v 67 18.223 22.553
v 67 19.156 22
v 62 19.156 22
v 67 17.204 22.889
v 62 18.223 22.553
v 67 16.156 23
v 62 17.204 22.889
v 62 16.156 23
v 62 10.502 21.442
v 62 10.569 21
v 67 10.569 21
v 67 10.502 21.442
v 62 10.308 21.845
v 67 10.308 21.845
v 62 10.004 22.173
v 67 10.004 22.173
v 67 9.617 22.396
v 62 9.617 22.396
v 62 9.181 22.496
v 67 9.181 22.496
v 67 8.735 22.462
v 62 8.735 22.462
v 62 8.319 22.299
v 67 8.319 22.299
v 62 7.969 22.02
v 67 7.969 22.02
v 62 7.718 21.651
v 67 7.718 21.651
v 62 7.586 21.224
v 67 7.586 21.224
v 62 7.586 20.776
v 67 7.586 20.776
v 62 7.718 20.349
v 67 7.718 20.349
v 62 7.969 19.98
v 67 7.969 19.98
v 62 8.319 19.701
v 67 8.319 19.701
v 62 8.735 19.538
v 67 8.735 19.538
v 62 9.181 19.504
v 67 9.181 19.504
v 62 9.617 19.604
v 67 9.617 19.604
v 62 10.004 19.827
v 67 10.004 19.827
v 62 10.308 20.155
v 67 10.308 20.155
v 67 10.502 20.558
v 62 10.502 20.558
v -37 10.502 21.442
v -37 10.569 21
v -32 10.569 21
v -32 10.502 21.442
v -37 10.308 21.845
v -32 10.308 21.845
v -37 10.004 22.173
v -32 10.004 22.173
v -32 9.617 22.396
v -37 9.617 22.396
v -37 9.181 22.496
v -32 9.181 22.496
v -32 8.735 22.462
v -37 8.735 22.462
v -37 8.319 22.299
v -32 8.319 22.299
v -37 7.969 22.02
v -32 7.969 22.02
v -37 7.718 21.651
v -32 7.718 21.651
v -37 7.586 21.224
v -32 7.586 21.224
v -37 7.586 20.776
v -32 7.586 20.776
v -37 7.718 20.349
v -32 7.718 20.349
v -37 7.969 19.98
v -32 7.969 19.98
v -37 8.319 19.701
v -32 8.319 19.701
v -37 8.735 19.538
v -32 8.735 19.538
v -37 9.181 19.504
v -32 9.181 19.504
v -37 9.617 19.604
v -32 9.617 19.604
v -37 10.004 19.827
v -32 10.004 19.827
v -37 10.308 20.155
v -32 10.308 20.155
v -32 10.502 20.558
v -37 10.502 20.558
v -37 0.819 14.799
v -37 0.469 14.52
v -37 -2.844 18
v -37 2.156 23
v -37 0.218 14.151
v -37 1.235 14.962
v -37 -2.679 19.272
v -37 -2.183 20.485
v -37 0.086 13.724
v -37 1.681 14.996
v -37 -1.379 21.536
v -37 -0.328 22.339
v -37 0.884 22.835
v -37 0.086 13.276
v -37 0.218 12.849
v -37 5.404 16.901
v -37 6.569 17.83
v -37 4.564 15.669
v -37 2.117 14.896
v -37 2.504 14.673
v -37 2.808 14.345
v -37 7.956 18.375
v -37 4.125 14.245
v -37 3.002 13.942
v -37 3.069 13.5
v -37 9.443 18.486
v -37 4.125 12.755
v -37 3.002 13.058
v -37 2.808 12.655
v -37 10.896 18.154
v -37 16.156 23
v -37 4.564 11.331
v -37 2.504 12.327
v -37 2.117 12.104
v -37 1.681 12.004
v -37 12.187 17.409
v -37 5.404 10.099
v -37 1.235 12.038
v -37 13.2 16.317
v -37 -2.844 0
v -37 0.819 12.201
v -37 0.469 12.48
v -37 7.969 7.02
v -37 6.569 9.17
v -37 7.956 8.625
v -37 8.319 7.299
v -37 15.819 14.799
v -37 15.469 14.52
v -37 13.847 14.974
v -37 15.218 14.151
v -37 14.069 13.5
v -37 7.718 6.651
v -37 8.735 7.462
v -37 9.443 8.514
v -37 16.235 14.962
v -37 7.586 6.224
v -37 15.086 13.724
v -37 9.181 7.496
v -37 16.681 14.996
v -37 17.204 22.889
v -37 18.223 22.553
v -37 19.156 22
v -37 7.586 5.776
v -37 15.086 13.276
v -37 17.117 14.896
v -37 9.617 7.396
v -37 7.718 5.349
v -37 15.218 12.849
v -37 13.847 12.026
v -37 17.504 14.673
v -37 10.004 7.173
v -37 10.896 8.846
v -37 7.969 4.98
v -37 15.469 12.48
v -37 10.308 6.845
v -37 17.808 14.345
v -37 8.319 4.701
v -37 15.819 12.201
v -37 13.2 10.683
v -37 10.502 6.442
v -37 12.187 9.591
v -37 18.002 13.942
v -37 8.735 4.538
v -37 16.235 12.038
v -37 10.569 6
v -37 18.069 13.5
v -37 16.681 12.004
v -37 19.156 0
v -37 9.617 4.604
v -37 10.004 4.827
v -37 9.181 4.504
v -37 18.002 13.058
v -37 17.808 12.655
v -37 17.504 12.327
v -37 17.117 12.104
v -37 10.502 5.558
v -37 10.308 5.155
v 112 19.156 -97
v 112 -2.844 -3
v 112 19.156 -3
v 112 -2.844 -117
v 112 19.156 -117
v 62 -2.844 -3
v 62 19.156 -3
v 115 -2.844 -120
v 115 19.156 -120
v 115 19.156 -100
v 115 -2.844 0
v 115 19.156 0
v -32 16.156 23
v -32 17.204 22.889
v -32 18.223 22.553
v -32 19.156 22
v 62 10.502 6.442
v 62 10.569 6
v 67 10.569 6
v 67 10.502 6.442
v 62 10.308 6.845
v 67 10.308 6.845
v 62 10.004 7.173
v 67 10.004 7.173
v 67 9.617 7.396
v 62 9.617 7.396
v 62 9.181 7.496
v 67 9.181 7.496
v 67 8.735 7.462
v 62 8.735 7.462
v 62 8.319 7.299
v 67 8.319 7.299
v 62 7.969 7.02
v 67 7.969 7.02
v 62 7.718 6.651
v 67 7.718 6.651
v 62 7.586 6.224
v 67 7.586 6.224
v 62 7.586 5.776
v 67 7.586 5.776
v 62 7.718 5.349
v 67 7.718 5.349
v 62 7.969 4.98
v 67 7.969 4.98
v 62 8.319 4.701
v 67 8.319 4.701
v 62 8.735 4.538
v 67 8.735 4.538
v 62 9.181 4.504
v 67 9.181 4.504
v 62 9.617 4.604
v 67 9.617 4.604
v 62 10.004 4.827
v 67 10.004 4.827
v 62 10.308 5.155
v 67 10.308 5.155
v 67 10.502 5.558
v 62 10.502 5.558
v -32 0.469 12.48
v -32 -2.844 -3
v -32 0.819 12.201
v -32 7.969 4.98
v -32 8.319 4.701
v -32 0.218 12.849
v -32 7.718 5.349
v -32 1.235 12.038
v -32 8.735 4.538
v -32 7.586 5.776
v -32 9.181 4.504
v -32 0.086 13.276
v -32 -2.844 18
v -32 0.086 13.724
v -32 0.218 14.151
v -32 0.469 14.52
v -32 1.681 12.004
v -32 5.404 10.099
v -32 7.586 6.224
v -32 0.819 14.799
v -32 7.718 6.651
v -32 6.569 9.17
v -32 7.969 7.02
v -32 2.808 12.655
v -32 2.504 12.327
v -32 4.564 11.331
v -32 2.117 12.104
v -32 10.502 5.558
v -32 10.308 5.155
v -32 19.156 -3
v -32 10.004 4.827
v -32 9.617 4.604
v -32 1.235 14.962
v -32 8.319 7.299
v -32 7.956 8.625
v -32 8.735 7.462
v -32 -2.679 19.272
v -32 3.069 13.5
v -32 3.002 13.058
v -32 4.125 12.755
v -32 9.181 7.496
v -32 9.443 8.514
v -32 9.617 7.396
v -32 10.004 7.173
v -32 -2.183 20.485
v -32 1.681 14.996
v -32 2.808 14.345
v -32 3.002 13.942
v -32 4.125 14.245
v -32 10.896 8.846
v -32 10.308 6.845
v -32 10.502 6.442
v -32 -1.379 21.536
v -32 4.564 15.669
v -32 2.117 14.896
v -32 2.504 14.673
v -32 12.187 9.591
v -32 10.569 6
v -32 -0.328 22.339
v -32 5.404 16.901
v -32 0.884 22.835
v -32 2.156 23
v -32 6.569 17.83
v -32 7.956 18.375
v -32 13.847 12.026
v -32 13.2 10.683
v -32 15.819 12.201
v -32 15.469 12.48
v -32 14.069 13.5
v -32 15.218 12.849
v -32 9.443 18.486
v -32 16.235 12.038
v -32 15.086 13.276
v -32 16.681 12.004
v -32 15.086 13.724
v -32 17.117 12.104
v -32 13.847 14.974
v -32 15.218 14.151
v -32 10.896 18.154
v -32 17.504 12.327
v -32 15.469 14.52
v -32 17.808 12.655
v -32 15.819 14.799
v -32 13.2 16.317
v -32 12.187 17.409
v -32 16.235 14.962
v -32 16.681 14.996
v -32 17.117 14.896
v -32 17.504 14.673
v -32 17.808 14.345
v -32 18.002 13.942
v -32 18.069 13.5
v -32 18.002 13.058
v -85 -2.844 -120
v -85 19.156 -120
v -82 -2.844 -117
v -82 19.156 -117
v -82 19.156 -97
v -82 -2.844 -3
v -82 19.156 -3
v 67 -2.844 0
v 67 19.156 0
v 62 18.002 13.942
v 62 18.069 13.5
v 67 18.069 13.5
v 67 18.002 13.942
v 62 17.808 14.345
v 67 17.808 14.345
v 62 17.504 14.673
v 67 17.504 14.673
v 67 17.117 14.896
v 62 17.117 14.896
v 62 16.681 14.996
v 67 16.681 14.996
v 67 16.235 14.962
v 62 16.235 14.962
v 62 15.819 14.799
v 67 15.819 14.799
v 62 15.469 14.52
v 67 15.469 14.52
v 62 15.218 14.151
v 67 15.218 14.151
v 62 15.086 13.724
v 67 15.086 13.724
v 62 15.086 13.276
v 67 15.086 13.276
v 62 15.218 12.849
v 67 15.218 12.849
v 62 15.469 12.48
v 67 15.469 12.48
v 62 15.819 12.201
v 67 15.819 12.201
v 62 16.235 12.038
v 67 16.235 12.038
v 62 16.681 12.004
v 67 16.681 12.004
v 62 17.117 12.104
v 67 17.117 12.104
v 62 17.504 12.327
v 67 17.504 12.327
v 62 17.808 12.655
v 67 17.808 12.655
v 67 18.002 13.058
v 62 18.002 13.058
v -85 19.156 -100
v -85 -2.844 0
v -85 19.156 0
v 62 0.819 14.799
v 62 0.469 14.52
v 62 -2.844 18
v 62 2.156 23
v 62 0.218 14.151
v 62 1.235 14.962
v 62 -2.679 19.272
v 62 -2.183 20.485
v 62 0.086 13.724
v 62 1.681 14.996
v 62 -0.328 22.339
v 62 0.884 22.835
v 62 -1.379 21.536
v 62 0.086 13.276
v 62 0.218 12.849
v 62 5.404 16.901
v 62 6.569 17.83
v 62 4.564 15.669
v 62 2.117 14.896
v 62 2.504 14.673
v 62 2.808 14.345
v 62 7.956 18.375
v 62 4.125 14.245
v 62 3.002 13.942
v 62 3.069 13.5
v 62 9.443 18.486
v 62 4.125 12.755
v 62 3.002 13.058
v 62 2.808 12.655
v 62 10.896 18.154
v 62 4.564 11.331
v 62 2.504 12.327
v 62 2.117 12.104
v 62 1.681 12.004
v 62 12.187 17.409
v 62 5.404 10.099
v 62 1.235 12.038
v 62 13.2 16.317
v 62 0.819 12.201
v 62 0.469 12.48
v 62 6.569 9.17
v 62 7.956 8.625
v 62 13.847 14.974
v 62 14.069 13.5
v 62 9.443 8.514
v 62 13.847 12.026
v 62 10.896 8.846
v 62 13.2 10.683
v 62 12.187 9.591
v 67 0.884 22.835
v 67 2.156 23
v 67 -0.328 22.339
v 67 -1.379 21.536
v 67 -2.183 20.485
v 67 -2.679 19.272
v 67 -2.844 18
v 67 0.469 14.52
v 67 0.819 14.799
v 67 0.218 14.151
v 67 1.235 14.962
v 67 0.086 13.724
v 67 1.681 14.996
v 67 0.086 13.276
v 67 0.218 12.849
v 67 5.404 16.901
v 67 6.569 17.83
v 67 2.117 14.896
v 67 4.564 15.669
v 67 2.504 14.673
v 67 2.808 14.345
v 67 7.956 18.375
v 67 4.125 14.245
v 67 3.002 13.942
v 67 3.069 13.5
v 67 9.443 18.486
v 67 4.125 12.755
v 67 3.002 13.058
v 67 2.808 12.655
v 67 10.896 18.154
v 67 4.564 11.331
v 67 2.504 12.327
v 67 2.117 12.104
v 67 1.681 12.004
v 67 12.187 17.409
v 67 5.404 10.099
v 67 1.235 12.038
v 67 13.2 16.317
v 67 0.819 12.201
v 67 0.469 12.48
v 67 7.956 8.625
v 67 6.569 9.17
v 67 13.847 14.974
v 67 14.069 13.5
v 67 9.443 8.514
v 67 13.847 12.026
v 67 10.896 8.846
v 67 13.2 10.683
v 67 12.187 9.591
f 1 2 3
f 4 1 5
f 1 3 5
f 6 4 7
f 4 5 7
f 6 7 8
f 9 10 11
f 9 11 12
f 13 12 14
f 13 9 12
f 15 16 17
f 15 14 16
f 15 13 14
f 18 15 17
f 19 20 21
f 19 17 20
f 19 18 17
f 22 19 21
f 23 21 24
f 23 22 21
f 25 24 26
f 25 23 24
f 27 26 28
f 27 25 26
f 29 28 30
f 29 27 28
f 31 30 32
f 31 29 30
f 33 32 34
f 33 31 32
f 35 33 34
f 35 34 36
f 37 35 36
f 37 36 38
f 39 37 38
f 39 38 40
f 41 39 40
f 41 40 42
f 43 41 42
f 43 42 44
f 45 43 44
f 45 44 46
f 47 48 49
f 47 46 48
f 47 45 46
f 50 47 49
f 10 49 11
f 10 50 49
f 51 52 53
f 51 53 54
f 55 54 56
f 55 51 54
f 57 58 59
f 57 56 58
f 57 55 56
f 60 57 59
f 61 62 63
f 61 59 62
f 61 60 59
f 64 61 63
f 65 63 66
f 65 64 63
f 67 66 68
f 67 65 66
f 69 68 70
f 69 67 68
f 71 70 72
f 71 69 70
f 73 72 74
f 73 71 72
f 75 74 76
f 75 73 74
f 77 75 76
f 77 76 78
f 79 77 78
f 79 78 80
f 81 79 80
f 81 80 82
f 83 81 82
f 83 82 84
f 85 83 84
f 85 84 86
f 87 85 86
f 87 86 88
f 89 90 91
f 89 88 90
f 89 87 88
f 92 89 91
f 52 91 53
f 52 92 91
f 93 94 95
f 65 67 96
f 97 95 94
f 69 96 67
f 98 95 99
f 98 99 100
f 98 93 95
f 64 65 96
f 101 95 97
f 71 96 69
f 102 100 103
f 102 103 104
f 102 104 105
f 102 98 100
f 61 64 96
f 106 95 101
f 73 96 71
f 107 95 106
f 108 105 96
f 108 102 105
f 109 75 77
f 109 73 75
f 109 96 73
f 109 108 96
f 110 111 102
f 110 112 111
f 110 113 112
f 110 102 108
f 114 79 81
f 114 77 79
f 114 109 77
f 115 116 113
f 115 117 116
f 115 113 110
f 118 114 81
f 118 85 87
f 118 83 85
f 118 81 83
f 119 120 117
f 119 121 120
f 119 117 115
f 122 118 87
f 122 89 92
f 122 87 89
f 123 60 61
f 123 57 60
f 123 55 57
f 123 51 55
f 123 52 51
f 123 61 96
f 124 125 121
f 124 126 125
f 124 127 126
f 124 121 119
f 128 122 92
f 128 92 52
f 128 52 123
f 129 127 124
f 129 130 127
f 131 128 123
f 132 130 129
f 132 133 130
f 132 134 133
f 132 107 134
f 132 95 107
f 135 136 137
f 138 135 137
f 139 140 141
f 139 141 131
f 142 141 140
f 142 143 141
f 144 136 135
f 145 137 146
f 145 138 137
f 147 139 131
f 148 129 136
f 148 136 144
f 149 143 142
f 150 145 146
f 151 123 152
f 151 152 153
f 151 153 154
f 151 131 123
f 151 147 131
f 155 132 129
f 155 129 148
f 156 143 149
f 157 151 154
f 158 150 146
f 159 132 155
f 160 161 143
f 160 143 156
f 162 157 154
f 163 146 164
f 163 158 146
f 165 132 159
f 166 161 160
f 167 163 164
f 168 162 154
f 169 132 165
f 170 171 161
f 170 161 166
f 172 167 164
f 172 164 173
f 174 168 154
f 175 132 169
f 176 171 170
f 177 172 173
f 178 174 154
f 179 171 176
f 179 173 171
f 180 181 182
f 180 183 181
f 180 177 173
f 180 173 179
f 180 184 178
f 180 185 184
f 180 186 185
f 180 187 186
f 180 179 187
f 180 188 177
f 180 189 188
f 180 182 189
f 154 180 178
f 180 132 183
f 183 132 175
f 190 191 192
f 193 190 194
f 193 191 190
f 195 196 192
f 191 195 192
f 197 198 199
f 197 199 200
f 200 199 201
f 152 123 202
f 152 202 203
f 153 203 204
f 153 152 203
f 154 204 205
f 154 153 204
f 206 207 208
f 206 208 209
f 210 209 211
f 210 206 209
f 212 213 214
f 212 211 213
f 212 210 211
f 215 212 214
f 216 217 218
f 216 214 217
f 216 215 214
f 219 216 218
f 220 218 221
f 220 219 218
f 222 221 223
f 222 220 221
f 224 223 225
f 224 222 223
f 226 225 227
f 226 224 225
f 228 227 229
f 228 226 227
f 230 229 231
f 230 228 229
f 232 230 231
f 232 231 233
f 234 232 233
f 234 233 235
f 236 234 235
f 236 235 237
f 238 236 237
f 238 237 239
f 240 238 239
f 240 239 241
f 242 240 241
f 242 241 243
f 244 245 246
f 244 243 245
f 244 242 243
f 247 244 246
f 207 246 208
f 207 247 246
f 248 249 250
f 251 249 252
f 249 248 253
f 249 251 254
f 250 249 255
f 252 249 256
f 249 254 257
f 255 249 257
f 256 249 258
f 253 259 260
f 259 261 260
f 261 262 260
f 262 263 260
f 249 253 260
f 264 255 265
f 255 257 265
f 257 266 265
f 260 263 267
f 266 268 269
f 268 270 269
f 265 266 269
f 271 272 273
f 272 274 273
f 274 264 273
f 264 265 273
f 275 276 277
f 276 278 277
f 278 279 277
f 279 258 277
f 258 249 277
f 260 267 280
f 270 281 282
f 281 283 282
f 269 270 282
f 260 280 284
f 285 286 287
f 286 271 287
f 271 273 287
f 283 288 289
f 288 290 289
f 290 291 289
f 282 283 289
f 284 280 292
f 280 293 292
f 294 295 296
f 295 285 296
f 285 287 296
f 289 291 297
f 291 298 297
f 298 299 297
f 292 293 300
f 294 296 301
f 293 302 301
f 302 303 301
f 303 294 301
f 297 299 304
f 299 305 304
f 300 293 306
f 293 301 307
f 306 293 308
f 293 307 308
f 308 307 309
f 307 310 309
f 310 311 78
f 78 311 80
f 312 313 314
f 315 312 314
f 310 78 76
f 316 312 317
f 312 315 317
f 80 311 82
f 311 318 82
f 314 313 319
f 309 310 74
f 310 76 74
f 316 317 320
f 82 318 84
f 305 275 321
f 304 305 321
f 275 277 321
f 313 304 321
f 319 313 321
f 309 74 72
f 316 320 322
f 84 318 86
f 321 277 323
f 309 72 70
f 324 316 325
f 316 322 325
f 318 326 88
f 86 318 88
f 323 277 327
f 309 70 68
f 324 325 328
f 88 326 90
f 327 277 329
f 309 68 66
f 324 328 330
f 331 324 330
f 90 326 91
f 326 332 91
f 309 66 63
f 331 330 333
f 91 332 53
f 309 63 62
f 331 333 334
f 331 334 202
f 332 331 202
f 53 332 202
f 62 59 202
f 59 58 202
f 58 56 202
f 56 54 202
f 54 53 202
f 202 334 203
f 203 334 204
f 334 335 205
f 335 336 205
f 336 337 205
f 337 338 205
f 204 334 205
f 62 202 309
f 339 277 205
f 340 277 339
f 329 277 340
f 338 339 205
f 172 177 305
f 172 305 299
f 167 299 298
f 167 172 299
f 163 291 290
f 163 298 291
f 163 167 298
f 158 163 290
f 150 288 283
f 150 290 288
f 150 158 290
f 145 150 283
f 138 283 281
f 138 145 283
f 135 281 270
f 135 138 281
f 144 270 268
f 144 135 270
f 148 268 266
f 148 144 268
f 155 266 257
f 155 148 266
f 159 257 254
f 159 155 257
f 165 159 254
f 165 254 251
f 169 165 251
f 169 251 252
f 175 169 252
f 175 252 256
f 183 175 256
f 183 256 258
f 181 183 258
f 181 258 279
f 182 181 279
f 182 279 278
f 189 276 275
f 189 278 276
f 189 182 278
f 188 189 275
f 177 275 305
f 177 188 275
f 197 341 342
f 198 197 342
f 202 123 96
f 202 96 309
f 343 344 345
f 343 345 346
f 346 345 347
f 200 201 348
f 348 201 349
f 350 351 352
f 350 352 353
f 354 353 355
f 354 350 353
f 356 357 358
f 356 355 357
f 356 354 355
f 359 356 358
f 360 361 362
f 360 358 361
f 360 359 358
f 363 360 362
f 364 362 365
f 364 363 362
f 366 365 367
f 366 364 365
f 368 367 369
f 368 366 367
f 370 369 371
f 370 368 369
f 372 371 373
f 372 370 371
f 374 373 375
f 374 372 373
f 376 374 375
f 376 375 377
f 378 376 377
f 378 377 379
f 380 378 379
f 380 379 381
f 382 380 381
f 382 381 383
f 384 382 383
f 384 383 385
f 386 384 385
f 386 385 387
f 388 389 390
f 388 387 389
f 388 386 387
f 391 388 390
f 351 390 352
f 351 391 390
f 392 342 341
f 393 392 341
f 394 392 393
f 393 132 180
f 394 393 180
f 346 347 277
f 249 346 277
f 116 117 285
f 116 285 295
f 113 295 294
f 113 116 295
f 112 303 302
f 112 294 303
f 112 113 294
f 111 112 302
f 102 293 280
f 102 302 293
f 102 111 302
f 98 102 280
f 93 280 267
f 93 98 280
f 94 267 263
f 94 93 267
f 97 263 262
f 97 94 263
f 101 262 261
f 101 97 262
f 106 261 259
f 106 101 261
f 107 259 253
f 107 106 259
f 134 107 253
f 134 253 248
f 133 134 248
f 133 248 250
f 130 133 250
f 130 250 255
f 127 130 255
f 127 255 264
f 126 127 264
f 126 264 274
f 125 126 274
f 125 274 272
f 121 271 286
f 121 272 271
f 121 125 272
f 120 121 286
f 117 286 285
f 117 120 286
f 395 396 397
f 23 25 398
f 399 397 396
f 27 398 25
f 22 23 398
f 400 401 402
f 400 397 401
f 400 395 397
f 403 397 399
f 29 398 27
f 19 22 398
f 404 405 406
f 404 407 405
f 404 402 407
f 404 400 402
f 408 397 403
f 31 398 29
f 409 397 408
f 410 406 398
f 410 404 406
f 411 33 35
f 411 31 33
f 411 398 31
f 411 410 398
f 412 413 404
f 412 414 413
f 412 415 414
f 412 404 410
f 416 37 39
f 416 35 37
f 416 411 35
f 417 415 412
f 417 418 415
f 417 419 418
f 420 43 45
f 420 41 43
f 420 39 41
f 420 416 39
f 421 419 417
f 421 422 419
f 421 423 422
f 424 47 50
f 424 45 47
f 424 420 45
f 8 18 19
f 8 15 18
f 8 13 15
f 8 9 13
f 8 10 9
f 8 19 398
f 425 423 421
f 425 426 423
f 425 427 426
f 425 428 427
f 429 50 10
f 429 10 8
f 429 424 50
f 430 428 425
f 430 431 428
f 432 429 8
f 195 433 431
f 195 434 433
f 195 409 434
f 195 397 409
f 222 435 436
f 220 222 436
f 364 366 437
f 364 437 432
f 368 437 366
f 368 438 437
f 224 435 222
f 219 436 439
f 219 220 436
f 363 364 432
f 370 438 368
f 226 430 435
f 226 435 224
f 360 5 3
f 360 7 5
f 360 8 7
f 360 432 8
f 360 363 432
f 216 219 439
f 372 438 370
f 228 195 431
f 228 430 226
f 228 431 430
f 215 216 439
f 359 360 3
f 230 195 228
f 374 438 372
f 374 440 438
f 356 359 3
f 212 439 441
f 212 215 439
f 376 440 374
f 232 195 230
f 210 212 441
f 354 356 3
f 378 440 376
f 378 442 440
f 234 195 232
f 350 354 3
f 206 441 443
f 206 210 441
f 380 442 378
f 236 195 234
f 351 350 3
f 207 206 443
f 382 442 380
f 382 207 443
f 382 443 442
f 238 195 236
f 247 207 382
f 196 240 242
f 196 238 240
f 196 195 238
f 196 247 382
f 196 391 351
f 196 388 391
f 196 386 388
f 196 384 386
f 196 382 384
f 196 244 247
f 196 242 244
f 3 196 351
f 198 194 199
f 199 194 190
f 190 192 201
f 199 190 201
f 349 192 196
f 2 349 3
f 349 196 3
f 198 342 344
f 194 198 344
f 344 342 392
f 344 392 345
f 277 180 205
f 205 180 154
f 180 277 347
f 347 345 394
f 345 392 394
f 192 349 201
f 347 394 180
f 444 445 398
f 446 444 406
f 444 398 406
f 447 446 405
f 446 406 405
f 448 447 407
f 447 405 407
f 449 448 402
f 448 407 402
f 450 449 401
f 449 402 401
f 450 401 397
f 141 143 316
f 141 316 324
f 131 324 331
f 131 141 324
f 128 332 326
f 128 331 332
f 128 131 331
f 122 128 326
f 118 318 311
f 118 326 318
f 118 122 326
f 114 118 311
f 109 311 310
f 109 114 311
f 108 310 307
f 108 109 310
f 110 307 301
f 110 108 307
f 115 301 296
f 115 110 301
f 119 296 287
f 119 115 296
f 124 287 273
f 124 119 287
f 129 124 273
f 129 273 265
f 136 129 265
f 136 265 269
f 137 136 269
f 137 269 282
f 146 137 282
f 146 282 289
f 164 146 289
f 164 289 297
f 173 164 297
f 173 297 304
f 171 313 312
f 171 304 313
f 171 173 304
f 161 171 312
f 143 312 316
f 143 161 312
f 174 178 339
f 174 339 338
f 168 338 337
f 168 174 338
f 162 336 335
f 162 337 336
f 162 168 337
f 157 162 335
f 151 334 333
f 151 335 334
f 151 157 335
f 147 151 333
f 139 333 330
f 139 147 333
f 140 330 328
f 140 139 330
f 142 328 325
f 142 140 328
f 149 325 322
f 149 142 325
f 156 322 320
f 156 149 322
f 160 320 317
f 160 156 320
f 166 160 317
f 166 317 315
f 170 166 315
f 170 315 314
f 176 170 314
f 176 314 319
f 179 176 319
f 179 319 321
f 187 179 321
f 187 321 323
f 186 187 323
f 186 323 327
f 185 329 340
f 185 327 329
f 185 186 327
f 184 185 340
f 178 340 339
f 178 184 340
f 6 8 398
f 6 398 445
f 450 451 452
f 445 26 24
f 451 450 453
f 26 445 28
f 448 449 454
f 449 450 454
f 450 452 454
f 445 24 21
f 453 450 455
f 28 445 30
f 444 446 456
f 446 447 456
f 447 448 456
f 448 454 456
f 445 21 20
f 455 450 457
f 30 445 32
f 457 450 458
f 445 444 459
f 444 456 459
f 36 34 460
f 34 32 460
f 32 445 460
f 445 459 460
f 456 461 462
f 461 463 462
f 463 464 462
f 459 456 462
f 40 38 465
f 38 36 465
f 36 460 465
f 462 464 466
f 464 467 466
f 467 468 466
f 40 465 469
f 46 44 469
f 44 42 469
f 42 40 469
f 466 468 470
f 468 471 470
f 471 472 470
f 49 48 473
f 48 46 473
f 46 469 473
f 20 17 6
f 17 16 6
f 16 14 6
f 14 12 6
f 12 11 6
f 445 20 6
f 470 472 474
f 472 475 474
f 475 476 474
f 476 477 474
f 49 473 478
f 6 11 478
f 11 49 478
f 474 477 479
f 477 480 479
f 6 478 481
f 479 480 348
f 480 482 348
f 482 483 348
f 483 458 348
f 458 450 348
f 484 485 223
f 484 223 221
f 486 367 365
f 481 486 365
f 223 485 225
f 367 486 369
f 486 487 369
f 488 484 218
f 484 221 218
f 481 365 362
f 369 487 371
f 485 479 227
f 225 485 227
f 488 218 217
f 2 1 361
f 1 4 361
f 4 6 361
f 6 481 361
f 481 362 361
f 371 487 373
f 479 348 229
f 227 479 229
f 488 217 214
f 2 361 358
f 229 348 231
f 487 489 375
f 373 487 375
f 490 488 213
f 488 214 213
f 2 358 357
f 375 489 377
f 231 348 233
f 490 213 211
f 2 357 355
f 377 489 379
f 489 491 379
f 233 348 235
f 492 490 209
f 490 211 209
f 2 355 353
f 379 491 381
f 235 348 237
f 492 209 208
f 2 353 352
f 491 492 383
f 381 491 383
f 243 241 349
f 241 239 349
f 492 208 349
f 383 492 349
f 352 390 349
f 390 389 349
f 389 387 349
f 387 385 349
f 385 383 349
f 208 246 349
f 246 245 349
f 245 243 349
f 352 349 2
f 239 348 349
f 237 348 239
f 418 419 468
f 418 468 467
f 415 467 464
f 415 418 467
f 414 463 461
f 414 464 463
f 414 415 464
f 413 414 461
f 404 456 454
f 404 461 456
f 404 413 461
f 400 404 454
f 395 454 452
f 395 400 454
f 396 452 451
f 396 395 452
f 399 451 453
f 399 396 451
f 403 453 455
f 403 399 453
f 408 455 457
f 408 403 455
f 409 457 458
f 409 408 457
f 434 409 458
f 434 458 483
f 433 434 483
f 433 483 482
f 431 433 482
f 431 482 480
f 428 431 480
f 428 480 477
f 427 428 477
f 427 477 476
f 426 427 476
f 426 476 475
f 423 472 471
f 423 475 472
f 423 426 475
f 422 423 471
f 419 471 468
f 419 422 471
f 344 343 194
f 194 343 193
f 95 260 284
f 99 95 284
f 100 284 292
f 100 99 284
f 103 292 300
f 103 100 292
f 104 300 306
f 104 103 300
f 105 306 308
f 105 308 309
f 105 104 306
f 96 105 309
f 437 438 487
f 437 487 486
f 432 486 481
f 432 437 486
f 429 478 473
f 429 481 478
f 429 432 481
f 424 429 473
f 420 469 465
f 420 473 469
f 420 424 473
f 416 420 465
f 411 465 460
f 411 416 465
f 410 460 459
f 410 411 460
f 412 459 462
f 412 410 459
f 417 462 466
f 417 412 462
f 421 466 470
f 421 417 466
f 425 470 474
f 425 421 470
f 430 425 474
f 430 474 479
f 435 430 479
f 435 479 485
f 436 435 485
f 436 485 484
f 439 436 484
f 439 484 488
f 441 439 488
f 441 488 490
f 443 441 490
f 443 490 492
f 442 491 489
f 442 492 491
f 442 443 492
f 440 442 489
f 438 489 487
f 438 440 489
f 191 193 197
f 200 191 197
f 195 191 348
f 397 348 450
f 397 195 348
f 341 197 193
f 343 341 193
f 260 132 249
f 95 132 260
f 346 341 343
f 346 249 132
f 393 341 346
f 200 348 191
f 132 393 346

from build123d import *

# Parameters (mm, degrees)
SKETCH_1_W               = 104
SKETCH_1_H               = 40
SKETCH_1_R               = 5
SKETCH_1_R_2             = 1.5
EXTRUDE_1_DEPTH          = 3
SKETCH_2_W               = 5
SKETCH_2_H               = 40
EXTRUDE_2_DEPTH          = 20
CUT_EXTRUDE_1_DEPTH      = 111.431414635
CUT_EXTRUDE_1_DEPTH_BACK = 111.431414635
SKETCH_3_R               = 1.5
SKETCH_3_R_2             = 5
FILLET_1_R               = 10
SKETCH_4_W               = 200
SKETCH_4_H               = 40
EXTRUDE_3_DEPTH          = 100
CUT_EXTRUDE_2_DEPTH      = 100
CUT_EXTRUDE_3_DEPTH      = 185.266376038
CUT_EXTRUDE_3_DEPTH_BACK = 185.266376038
FILLET_2_R               = 5
CUT_EXTRUDE_4_DEPTH      = 226.499661516
CUT_EXTRUDE_4_DEPTH_BACK = 226.499661516
CUT_EXTRUDE_5_DEPTH      = 225.605419664
CUT_EXTRUDE_5_DEPTH_BACK = 225.605419664
SKETCH_8_W               = 135.335857316
SKETCH_8_H               = 8.120151439
SKETCH_9_W               = 20
SKETCH_9_H               = 22
EXTRUDE_4_DEPTH          = 200
CUT_EXTRUDE_6_DEPTH      = 168.657388896
CUT_EXTRUDE_6_DEPTH_BACK = 168.657388896
SKETCH_10_W              = 194
SKETCH_10_H              = 20


with BuildPart() as part:
    # 草图1 → 凸台-拉伸1 (new body)
    with BuildSketch(Plane.XY):
        with Locations((15, 9.156428763)):
            Rectangle(SKETCH_1_W, SKETCH_1_H)
        with Locations((15, 9.156428763)):
            Circle(SKETCH_1_R, mode=Mode.SUBTRACT)
        with Locations((15, 16.656428763)):
            Circle(SKETCH_1_R_2, mode=Mode.SUBTRACT)
        with Locations((22.5, 9.156428763)):
            Circle(SKETCH_1_R_2, mode=Mode.SUBTRACT)
        with Locations((15, 1.656428763)):
            Circle(SKETCH_1_R_2, mode=Mode.SUBTRACT)
        with Locations((7.5, 9.156428763)):
            Circle(SKETCH_1_R_2, mode=Mode.SUBTRACT)
    extrude(amount=EXTRUDE_1_DEPTH)

    # 草图2 → 凸台-拉伸2 (add)
    with BuildSketch(Plane.XY.offset(3)):
        with Locations((-34.5, 9.156428763)):
            Rectangle(SKETCH_2_W, SKETCH_2_H)
        with Locations((64.5, 9.156428763)):
            Rectangle(SKETCH_2_W, SKETCH_2_H)
    extrude(amount=EXTRUDE_2_DEPTH)

    # 草图3 → 切除-拉伸1 (cut, two sides: drawn at the far end of the back side and taken through both)
    with BuildSketch(Plane(origin=(67, 0, 0), x_dir=(0, 0, -1), z_dir=(1, 0, 0)).offset(-CUT_EXTRUDE_1_DEPTH_BACK)):
        with Locations(Location((-13.5, 16.569068444, 0), (0, 0, 90))):
            Circle(SKETCH_3_R)
        with Locations(Location((-13.5, 1.569068444, 0), (0, 0, 90))):
            Circle(SKETCH_3_R)
        with Locations(Location((-13.5, 9.069068444, 0), (0, 0, 90))):
            Circle(SKETCH_3_R_2)
        with Locations(Location((-6, 9.069068444, 0), (0, 0, 90))):
            Circle(SKETCH_3_R)
        with Locations(Location((-21, 9.069068444, 0), (0, 0, 90))):
            Circle(SKETCH_3_R)
    extrude(amount=CUT_EXTRUDE_1_DEPTH + CUT_EXTRUDE_1_DEPTH_BACK, mode=Mode.SUBTRACT)

    # 圆角1
    fillet_1_edges = [part.edges().sort_by_distance(p)[0] for p in [
        (-34.5, 29.156428763, 23),
        (-34.5, -10.843571237, 23),
        (64.5, 29.156428763, 23),
        (64.5, -10.843571237, 23),
    ]]
    fillet(fillet_1_edges, radius=FILLET_1_R)

    # 草图4 → 凸台-拉伸3 (add)
    with BuildSketch(Plane(origin=(0, 0, 0), x_dir=(-1, 0, 0), z_dir=(0, 0, -1))):
        with Locations((-15, 9.156428763)):
            Rectangle(SKETCH_4_W, SKETCH_4_H)
    extrude(amount=EXTRUDE_3_DEPTH)

    # 草图5 → 切除-拉伸2 (cut)
    with BuildSketch(Plane(origin=(0, 29.156428763, 0), x_dir=(1, 0, 0), z_dir=(0, 1, 0))):
        Polygon((112, 97), (-82, 97), (-82, 3), (-32, 3), (-32, -3), (62, -3), (62, 3), (112, 3), align=None)
    extrude(amount=-CUT_EXTRUDE_2_DEPTH, mode=Mode.SUBTRACT)

    # 草图6 → 切除-拉伸3 (cut, two sides: drawn at the far end of the back side and taken through both)
    with BuildSketch(Plane.ZY.offset(37).offset(-CUT_EXTRUDE_3_DEPTH_BACK)):
        Polygon((0, 21.156428763), (22.797958971, 21.156428763), (26.883028225, 31.204196531), (0, 34.707184858), align=None)
        Polygon((0, -2.843571237), (22.797958971, -2.843571237), (28.320151641, -11.460404888), (0, -17.388538979), align=None)
    extrude(amount=CUT_EXTRUDE_3_DEPTH + CUT_EXTRUDE_3_DEPTH_BACK, mode=Mode.SUBTRACT)

    # 圆角2
    fillet_2_edges = [part.edges().sort_by_distance(p)[0] for p in [
        (-34.5, -2.843571237, 22.797958971),
        (-34.5, 21.156428763, 22.797958971),
        (64.5, -2.843571237, 22.797958971),
        (64.5, 21.156428763, 22.797958971),
    ]]
    fillet(fillet_2_edges, radius=FILLET_2_R)

    # 草图7 → 切除-拉伸4 (cut, two sides: drawn at the far end of the back side and taken through both)
    with BuildSketch(Plane.ZY.offset(85).offset(-CUT_EXTRUDE_4_DEPTH_BACK)):
        Polygon((0, 21.156428763), (-100, 21.156428763), (-112.355284076, 36.746993881), (4.033553215, 41.186010001), align=None)
        Polygon((-100, -2.843571237), (0, -2.843571237), (4.033553215, -17.712155102), (-111.164328532, -19.119648018), align=None)
    extrude(amount=CUT_EXTRUDE_4_DEPTH + CUT_EXTRUDE_4_DEPTH_BACK, mode=Mode.SUBTRACT)

    # 草图8 → 切除-拉伸5 (cut, two sides: drawn at the far end of the back side and taken through both)
    with BuildSketch(Plane.ZY.offset(85).offset(-CUT_EXTRUDE_5_DEPTH_BACK)):
        with Locations((-37.649890838, 23.216504482)):
            Rectangle(SKETCH_8_W, SKETCH_8_H)
    extrude(amount=CUT_EXTRUDE_5_DEPTH + CUT_EXTRUDE_5_DEPTH_BACK, mode=Mode.SUBTRACT)

    # 草图9 → 凸台-拉伸4 (add)
    with BuildSketch(Plane.ZY.offset(85)):
        with Locations((-110, 8.156428763)):
            Rectangle(SKETCH_9_W, SKETCH_9_H)
    extrude(amount=-EXTRUDE_4_DEPTH)

    # 草图10 → 切除-拉伸6 (cut, two sides: drawn at the far end of the back side and taken through both)
    with BuildSketch(Plane(origin=(0, 19.156428763, 0), x_dir=(1, 0, 0), z_dir=(0, 1, 0)).offset(-CUT_EXTRUDE_6_DEPTH_BACK)):
        with Locations((15, 107)):
            Rectangle(SKETCH_10_W, SKETCH_10_H)
    extrude(amount=CUT_EXTRUDE_6_DEPTH + CUT_EXTRUDE_6_DEPTH_BACK, mode=Mode.SUBTRACT)


solid = part.part
